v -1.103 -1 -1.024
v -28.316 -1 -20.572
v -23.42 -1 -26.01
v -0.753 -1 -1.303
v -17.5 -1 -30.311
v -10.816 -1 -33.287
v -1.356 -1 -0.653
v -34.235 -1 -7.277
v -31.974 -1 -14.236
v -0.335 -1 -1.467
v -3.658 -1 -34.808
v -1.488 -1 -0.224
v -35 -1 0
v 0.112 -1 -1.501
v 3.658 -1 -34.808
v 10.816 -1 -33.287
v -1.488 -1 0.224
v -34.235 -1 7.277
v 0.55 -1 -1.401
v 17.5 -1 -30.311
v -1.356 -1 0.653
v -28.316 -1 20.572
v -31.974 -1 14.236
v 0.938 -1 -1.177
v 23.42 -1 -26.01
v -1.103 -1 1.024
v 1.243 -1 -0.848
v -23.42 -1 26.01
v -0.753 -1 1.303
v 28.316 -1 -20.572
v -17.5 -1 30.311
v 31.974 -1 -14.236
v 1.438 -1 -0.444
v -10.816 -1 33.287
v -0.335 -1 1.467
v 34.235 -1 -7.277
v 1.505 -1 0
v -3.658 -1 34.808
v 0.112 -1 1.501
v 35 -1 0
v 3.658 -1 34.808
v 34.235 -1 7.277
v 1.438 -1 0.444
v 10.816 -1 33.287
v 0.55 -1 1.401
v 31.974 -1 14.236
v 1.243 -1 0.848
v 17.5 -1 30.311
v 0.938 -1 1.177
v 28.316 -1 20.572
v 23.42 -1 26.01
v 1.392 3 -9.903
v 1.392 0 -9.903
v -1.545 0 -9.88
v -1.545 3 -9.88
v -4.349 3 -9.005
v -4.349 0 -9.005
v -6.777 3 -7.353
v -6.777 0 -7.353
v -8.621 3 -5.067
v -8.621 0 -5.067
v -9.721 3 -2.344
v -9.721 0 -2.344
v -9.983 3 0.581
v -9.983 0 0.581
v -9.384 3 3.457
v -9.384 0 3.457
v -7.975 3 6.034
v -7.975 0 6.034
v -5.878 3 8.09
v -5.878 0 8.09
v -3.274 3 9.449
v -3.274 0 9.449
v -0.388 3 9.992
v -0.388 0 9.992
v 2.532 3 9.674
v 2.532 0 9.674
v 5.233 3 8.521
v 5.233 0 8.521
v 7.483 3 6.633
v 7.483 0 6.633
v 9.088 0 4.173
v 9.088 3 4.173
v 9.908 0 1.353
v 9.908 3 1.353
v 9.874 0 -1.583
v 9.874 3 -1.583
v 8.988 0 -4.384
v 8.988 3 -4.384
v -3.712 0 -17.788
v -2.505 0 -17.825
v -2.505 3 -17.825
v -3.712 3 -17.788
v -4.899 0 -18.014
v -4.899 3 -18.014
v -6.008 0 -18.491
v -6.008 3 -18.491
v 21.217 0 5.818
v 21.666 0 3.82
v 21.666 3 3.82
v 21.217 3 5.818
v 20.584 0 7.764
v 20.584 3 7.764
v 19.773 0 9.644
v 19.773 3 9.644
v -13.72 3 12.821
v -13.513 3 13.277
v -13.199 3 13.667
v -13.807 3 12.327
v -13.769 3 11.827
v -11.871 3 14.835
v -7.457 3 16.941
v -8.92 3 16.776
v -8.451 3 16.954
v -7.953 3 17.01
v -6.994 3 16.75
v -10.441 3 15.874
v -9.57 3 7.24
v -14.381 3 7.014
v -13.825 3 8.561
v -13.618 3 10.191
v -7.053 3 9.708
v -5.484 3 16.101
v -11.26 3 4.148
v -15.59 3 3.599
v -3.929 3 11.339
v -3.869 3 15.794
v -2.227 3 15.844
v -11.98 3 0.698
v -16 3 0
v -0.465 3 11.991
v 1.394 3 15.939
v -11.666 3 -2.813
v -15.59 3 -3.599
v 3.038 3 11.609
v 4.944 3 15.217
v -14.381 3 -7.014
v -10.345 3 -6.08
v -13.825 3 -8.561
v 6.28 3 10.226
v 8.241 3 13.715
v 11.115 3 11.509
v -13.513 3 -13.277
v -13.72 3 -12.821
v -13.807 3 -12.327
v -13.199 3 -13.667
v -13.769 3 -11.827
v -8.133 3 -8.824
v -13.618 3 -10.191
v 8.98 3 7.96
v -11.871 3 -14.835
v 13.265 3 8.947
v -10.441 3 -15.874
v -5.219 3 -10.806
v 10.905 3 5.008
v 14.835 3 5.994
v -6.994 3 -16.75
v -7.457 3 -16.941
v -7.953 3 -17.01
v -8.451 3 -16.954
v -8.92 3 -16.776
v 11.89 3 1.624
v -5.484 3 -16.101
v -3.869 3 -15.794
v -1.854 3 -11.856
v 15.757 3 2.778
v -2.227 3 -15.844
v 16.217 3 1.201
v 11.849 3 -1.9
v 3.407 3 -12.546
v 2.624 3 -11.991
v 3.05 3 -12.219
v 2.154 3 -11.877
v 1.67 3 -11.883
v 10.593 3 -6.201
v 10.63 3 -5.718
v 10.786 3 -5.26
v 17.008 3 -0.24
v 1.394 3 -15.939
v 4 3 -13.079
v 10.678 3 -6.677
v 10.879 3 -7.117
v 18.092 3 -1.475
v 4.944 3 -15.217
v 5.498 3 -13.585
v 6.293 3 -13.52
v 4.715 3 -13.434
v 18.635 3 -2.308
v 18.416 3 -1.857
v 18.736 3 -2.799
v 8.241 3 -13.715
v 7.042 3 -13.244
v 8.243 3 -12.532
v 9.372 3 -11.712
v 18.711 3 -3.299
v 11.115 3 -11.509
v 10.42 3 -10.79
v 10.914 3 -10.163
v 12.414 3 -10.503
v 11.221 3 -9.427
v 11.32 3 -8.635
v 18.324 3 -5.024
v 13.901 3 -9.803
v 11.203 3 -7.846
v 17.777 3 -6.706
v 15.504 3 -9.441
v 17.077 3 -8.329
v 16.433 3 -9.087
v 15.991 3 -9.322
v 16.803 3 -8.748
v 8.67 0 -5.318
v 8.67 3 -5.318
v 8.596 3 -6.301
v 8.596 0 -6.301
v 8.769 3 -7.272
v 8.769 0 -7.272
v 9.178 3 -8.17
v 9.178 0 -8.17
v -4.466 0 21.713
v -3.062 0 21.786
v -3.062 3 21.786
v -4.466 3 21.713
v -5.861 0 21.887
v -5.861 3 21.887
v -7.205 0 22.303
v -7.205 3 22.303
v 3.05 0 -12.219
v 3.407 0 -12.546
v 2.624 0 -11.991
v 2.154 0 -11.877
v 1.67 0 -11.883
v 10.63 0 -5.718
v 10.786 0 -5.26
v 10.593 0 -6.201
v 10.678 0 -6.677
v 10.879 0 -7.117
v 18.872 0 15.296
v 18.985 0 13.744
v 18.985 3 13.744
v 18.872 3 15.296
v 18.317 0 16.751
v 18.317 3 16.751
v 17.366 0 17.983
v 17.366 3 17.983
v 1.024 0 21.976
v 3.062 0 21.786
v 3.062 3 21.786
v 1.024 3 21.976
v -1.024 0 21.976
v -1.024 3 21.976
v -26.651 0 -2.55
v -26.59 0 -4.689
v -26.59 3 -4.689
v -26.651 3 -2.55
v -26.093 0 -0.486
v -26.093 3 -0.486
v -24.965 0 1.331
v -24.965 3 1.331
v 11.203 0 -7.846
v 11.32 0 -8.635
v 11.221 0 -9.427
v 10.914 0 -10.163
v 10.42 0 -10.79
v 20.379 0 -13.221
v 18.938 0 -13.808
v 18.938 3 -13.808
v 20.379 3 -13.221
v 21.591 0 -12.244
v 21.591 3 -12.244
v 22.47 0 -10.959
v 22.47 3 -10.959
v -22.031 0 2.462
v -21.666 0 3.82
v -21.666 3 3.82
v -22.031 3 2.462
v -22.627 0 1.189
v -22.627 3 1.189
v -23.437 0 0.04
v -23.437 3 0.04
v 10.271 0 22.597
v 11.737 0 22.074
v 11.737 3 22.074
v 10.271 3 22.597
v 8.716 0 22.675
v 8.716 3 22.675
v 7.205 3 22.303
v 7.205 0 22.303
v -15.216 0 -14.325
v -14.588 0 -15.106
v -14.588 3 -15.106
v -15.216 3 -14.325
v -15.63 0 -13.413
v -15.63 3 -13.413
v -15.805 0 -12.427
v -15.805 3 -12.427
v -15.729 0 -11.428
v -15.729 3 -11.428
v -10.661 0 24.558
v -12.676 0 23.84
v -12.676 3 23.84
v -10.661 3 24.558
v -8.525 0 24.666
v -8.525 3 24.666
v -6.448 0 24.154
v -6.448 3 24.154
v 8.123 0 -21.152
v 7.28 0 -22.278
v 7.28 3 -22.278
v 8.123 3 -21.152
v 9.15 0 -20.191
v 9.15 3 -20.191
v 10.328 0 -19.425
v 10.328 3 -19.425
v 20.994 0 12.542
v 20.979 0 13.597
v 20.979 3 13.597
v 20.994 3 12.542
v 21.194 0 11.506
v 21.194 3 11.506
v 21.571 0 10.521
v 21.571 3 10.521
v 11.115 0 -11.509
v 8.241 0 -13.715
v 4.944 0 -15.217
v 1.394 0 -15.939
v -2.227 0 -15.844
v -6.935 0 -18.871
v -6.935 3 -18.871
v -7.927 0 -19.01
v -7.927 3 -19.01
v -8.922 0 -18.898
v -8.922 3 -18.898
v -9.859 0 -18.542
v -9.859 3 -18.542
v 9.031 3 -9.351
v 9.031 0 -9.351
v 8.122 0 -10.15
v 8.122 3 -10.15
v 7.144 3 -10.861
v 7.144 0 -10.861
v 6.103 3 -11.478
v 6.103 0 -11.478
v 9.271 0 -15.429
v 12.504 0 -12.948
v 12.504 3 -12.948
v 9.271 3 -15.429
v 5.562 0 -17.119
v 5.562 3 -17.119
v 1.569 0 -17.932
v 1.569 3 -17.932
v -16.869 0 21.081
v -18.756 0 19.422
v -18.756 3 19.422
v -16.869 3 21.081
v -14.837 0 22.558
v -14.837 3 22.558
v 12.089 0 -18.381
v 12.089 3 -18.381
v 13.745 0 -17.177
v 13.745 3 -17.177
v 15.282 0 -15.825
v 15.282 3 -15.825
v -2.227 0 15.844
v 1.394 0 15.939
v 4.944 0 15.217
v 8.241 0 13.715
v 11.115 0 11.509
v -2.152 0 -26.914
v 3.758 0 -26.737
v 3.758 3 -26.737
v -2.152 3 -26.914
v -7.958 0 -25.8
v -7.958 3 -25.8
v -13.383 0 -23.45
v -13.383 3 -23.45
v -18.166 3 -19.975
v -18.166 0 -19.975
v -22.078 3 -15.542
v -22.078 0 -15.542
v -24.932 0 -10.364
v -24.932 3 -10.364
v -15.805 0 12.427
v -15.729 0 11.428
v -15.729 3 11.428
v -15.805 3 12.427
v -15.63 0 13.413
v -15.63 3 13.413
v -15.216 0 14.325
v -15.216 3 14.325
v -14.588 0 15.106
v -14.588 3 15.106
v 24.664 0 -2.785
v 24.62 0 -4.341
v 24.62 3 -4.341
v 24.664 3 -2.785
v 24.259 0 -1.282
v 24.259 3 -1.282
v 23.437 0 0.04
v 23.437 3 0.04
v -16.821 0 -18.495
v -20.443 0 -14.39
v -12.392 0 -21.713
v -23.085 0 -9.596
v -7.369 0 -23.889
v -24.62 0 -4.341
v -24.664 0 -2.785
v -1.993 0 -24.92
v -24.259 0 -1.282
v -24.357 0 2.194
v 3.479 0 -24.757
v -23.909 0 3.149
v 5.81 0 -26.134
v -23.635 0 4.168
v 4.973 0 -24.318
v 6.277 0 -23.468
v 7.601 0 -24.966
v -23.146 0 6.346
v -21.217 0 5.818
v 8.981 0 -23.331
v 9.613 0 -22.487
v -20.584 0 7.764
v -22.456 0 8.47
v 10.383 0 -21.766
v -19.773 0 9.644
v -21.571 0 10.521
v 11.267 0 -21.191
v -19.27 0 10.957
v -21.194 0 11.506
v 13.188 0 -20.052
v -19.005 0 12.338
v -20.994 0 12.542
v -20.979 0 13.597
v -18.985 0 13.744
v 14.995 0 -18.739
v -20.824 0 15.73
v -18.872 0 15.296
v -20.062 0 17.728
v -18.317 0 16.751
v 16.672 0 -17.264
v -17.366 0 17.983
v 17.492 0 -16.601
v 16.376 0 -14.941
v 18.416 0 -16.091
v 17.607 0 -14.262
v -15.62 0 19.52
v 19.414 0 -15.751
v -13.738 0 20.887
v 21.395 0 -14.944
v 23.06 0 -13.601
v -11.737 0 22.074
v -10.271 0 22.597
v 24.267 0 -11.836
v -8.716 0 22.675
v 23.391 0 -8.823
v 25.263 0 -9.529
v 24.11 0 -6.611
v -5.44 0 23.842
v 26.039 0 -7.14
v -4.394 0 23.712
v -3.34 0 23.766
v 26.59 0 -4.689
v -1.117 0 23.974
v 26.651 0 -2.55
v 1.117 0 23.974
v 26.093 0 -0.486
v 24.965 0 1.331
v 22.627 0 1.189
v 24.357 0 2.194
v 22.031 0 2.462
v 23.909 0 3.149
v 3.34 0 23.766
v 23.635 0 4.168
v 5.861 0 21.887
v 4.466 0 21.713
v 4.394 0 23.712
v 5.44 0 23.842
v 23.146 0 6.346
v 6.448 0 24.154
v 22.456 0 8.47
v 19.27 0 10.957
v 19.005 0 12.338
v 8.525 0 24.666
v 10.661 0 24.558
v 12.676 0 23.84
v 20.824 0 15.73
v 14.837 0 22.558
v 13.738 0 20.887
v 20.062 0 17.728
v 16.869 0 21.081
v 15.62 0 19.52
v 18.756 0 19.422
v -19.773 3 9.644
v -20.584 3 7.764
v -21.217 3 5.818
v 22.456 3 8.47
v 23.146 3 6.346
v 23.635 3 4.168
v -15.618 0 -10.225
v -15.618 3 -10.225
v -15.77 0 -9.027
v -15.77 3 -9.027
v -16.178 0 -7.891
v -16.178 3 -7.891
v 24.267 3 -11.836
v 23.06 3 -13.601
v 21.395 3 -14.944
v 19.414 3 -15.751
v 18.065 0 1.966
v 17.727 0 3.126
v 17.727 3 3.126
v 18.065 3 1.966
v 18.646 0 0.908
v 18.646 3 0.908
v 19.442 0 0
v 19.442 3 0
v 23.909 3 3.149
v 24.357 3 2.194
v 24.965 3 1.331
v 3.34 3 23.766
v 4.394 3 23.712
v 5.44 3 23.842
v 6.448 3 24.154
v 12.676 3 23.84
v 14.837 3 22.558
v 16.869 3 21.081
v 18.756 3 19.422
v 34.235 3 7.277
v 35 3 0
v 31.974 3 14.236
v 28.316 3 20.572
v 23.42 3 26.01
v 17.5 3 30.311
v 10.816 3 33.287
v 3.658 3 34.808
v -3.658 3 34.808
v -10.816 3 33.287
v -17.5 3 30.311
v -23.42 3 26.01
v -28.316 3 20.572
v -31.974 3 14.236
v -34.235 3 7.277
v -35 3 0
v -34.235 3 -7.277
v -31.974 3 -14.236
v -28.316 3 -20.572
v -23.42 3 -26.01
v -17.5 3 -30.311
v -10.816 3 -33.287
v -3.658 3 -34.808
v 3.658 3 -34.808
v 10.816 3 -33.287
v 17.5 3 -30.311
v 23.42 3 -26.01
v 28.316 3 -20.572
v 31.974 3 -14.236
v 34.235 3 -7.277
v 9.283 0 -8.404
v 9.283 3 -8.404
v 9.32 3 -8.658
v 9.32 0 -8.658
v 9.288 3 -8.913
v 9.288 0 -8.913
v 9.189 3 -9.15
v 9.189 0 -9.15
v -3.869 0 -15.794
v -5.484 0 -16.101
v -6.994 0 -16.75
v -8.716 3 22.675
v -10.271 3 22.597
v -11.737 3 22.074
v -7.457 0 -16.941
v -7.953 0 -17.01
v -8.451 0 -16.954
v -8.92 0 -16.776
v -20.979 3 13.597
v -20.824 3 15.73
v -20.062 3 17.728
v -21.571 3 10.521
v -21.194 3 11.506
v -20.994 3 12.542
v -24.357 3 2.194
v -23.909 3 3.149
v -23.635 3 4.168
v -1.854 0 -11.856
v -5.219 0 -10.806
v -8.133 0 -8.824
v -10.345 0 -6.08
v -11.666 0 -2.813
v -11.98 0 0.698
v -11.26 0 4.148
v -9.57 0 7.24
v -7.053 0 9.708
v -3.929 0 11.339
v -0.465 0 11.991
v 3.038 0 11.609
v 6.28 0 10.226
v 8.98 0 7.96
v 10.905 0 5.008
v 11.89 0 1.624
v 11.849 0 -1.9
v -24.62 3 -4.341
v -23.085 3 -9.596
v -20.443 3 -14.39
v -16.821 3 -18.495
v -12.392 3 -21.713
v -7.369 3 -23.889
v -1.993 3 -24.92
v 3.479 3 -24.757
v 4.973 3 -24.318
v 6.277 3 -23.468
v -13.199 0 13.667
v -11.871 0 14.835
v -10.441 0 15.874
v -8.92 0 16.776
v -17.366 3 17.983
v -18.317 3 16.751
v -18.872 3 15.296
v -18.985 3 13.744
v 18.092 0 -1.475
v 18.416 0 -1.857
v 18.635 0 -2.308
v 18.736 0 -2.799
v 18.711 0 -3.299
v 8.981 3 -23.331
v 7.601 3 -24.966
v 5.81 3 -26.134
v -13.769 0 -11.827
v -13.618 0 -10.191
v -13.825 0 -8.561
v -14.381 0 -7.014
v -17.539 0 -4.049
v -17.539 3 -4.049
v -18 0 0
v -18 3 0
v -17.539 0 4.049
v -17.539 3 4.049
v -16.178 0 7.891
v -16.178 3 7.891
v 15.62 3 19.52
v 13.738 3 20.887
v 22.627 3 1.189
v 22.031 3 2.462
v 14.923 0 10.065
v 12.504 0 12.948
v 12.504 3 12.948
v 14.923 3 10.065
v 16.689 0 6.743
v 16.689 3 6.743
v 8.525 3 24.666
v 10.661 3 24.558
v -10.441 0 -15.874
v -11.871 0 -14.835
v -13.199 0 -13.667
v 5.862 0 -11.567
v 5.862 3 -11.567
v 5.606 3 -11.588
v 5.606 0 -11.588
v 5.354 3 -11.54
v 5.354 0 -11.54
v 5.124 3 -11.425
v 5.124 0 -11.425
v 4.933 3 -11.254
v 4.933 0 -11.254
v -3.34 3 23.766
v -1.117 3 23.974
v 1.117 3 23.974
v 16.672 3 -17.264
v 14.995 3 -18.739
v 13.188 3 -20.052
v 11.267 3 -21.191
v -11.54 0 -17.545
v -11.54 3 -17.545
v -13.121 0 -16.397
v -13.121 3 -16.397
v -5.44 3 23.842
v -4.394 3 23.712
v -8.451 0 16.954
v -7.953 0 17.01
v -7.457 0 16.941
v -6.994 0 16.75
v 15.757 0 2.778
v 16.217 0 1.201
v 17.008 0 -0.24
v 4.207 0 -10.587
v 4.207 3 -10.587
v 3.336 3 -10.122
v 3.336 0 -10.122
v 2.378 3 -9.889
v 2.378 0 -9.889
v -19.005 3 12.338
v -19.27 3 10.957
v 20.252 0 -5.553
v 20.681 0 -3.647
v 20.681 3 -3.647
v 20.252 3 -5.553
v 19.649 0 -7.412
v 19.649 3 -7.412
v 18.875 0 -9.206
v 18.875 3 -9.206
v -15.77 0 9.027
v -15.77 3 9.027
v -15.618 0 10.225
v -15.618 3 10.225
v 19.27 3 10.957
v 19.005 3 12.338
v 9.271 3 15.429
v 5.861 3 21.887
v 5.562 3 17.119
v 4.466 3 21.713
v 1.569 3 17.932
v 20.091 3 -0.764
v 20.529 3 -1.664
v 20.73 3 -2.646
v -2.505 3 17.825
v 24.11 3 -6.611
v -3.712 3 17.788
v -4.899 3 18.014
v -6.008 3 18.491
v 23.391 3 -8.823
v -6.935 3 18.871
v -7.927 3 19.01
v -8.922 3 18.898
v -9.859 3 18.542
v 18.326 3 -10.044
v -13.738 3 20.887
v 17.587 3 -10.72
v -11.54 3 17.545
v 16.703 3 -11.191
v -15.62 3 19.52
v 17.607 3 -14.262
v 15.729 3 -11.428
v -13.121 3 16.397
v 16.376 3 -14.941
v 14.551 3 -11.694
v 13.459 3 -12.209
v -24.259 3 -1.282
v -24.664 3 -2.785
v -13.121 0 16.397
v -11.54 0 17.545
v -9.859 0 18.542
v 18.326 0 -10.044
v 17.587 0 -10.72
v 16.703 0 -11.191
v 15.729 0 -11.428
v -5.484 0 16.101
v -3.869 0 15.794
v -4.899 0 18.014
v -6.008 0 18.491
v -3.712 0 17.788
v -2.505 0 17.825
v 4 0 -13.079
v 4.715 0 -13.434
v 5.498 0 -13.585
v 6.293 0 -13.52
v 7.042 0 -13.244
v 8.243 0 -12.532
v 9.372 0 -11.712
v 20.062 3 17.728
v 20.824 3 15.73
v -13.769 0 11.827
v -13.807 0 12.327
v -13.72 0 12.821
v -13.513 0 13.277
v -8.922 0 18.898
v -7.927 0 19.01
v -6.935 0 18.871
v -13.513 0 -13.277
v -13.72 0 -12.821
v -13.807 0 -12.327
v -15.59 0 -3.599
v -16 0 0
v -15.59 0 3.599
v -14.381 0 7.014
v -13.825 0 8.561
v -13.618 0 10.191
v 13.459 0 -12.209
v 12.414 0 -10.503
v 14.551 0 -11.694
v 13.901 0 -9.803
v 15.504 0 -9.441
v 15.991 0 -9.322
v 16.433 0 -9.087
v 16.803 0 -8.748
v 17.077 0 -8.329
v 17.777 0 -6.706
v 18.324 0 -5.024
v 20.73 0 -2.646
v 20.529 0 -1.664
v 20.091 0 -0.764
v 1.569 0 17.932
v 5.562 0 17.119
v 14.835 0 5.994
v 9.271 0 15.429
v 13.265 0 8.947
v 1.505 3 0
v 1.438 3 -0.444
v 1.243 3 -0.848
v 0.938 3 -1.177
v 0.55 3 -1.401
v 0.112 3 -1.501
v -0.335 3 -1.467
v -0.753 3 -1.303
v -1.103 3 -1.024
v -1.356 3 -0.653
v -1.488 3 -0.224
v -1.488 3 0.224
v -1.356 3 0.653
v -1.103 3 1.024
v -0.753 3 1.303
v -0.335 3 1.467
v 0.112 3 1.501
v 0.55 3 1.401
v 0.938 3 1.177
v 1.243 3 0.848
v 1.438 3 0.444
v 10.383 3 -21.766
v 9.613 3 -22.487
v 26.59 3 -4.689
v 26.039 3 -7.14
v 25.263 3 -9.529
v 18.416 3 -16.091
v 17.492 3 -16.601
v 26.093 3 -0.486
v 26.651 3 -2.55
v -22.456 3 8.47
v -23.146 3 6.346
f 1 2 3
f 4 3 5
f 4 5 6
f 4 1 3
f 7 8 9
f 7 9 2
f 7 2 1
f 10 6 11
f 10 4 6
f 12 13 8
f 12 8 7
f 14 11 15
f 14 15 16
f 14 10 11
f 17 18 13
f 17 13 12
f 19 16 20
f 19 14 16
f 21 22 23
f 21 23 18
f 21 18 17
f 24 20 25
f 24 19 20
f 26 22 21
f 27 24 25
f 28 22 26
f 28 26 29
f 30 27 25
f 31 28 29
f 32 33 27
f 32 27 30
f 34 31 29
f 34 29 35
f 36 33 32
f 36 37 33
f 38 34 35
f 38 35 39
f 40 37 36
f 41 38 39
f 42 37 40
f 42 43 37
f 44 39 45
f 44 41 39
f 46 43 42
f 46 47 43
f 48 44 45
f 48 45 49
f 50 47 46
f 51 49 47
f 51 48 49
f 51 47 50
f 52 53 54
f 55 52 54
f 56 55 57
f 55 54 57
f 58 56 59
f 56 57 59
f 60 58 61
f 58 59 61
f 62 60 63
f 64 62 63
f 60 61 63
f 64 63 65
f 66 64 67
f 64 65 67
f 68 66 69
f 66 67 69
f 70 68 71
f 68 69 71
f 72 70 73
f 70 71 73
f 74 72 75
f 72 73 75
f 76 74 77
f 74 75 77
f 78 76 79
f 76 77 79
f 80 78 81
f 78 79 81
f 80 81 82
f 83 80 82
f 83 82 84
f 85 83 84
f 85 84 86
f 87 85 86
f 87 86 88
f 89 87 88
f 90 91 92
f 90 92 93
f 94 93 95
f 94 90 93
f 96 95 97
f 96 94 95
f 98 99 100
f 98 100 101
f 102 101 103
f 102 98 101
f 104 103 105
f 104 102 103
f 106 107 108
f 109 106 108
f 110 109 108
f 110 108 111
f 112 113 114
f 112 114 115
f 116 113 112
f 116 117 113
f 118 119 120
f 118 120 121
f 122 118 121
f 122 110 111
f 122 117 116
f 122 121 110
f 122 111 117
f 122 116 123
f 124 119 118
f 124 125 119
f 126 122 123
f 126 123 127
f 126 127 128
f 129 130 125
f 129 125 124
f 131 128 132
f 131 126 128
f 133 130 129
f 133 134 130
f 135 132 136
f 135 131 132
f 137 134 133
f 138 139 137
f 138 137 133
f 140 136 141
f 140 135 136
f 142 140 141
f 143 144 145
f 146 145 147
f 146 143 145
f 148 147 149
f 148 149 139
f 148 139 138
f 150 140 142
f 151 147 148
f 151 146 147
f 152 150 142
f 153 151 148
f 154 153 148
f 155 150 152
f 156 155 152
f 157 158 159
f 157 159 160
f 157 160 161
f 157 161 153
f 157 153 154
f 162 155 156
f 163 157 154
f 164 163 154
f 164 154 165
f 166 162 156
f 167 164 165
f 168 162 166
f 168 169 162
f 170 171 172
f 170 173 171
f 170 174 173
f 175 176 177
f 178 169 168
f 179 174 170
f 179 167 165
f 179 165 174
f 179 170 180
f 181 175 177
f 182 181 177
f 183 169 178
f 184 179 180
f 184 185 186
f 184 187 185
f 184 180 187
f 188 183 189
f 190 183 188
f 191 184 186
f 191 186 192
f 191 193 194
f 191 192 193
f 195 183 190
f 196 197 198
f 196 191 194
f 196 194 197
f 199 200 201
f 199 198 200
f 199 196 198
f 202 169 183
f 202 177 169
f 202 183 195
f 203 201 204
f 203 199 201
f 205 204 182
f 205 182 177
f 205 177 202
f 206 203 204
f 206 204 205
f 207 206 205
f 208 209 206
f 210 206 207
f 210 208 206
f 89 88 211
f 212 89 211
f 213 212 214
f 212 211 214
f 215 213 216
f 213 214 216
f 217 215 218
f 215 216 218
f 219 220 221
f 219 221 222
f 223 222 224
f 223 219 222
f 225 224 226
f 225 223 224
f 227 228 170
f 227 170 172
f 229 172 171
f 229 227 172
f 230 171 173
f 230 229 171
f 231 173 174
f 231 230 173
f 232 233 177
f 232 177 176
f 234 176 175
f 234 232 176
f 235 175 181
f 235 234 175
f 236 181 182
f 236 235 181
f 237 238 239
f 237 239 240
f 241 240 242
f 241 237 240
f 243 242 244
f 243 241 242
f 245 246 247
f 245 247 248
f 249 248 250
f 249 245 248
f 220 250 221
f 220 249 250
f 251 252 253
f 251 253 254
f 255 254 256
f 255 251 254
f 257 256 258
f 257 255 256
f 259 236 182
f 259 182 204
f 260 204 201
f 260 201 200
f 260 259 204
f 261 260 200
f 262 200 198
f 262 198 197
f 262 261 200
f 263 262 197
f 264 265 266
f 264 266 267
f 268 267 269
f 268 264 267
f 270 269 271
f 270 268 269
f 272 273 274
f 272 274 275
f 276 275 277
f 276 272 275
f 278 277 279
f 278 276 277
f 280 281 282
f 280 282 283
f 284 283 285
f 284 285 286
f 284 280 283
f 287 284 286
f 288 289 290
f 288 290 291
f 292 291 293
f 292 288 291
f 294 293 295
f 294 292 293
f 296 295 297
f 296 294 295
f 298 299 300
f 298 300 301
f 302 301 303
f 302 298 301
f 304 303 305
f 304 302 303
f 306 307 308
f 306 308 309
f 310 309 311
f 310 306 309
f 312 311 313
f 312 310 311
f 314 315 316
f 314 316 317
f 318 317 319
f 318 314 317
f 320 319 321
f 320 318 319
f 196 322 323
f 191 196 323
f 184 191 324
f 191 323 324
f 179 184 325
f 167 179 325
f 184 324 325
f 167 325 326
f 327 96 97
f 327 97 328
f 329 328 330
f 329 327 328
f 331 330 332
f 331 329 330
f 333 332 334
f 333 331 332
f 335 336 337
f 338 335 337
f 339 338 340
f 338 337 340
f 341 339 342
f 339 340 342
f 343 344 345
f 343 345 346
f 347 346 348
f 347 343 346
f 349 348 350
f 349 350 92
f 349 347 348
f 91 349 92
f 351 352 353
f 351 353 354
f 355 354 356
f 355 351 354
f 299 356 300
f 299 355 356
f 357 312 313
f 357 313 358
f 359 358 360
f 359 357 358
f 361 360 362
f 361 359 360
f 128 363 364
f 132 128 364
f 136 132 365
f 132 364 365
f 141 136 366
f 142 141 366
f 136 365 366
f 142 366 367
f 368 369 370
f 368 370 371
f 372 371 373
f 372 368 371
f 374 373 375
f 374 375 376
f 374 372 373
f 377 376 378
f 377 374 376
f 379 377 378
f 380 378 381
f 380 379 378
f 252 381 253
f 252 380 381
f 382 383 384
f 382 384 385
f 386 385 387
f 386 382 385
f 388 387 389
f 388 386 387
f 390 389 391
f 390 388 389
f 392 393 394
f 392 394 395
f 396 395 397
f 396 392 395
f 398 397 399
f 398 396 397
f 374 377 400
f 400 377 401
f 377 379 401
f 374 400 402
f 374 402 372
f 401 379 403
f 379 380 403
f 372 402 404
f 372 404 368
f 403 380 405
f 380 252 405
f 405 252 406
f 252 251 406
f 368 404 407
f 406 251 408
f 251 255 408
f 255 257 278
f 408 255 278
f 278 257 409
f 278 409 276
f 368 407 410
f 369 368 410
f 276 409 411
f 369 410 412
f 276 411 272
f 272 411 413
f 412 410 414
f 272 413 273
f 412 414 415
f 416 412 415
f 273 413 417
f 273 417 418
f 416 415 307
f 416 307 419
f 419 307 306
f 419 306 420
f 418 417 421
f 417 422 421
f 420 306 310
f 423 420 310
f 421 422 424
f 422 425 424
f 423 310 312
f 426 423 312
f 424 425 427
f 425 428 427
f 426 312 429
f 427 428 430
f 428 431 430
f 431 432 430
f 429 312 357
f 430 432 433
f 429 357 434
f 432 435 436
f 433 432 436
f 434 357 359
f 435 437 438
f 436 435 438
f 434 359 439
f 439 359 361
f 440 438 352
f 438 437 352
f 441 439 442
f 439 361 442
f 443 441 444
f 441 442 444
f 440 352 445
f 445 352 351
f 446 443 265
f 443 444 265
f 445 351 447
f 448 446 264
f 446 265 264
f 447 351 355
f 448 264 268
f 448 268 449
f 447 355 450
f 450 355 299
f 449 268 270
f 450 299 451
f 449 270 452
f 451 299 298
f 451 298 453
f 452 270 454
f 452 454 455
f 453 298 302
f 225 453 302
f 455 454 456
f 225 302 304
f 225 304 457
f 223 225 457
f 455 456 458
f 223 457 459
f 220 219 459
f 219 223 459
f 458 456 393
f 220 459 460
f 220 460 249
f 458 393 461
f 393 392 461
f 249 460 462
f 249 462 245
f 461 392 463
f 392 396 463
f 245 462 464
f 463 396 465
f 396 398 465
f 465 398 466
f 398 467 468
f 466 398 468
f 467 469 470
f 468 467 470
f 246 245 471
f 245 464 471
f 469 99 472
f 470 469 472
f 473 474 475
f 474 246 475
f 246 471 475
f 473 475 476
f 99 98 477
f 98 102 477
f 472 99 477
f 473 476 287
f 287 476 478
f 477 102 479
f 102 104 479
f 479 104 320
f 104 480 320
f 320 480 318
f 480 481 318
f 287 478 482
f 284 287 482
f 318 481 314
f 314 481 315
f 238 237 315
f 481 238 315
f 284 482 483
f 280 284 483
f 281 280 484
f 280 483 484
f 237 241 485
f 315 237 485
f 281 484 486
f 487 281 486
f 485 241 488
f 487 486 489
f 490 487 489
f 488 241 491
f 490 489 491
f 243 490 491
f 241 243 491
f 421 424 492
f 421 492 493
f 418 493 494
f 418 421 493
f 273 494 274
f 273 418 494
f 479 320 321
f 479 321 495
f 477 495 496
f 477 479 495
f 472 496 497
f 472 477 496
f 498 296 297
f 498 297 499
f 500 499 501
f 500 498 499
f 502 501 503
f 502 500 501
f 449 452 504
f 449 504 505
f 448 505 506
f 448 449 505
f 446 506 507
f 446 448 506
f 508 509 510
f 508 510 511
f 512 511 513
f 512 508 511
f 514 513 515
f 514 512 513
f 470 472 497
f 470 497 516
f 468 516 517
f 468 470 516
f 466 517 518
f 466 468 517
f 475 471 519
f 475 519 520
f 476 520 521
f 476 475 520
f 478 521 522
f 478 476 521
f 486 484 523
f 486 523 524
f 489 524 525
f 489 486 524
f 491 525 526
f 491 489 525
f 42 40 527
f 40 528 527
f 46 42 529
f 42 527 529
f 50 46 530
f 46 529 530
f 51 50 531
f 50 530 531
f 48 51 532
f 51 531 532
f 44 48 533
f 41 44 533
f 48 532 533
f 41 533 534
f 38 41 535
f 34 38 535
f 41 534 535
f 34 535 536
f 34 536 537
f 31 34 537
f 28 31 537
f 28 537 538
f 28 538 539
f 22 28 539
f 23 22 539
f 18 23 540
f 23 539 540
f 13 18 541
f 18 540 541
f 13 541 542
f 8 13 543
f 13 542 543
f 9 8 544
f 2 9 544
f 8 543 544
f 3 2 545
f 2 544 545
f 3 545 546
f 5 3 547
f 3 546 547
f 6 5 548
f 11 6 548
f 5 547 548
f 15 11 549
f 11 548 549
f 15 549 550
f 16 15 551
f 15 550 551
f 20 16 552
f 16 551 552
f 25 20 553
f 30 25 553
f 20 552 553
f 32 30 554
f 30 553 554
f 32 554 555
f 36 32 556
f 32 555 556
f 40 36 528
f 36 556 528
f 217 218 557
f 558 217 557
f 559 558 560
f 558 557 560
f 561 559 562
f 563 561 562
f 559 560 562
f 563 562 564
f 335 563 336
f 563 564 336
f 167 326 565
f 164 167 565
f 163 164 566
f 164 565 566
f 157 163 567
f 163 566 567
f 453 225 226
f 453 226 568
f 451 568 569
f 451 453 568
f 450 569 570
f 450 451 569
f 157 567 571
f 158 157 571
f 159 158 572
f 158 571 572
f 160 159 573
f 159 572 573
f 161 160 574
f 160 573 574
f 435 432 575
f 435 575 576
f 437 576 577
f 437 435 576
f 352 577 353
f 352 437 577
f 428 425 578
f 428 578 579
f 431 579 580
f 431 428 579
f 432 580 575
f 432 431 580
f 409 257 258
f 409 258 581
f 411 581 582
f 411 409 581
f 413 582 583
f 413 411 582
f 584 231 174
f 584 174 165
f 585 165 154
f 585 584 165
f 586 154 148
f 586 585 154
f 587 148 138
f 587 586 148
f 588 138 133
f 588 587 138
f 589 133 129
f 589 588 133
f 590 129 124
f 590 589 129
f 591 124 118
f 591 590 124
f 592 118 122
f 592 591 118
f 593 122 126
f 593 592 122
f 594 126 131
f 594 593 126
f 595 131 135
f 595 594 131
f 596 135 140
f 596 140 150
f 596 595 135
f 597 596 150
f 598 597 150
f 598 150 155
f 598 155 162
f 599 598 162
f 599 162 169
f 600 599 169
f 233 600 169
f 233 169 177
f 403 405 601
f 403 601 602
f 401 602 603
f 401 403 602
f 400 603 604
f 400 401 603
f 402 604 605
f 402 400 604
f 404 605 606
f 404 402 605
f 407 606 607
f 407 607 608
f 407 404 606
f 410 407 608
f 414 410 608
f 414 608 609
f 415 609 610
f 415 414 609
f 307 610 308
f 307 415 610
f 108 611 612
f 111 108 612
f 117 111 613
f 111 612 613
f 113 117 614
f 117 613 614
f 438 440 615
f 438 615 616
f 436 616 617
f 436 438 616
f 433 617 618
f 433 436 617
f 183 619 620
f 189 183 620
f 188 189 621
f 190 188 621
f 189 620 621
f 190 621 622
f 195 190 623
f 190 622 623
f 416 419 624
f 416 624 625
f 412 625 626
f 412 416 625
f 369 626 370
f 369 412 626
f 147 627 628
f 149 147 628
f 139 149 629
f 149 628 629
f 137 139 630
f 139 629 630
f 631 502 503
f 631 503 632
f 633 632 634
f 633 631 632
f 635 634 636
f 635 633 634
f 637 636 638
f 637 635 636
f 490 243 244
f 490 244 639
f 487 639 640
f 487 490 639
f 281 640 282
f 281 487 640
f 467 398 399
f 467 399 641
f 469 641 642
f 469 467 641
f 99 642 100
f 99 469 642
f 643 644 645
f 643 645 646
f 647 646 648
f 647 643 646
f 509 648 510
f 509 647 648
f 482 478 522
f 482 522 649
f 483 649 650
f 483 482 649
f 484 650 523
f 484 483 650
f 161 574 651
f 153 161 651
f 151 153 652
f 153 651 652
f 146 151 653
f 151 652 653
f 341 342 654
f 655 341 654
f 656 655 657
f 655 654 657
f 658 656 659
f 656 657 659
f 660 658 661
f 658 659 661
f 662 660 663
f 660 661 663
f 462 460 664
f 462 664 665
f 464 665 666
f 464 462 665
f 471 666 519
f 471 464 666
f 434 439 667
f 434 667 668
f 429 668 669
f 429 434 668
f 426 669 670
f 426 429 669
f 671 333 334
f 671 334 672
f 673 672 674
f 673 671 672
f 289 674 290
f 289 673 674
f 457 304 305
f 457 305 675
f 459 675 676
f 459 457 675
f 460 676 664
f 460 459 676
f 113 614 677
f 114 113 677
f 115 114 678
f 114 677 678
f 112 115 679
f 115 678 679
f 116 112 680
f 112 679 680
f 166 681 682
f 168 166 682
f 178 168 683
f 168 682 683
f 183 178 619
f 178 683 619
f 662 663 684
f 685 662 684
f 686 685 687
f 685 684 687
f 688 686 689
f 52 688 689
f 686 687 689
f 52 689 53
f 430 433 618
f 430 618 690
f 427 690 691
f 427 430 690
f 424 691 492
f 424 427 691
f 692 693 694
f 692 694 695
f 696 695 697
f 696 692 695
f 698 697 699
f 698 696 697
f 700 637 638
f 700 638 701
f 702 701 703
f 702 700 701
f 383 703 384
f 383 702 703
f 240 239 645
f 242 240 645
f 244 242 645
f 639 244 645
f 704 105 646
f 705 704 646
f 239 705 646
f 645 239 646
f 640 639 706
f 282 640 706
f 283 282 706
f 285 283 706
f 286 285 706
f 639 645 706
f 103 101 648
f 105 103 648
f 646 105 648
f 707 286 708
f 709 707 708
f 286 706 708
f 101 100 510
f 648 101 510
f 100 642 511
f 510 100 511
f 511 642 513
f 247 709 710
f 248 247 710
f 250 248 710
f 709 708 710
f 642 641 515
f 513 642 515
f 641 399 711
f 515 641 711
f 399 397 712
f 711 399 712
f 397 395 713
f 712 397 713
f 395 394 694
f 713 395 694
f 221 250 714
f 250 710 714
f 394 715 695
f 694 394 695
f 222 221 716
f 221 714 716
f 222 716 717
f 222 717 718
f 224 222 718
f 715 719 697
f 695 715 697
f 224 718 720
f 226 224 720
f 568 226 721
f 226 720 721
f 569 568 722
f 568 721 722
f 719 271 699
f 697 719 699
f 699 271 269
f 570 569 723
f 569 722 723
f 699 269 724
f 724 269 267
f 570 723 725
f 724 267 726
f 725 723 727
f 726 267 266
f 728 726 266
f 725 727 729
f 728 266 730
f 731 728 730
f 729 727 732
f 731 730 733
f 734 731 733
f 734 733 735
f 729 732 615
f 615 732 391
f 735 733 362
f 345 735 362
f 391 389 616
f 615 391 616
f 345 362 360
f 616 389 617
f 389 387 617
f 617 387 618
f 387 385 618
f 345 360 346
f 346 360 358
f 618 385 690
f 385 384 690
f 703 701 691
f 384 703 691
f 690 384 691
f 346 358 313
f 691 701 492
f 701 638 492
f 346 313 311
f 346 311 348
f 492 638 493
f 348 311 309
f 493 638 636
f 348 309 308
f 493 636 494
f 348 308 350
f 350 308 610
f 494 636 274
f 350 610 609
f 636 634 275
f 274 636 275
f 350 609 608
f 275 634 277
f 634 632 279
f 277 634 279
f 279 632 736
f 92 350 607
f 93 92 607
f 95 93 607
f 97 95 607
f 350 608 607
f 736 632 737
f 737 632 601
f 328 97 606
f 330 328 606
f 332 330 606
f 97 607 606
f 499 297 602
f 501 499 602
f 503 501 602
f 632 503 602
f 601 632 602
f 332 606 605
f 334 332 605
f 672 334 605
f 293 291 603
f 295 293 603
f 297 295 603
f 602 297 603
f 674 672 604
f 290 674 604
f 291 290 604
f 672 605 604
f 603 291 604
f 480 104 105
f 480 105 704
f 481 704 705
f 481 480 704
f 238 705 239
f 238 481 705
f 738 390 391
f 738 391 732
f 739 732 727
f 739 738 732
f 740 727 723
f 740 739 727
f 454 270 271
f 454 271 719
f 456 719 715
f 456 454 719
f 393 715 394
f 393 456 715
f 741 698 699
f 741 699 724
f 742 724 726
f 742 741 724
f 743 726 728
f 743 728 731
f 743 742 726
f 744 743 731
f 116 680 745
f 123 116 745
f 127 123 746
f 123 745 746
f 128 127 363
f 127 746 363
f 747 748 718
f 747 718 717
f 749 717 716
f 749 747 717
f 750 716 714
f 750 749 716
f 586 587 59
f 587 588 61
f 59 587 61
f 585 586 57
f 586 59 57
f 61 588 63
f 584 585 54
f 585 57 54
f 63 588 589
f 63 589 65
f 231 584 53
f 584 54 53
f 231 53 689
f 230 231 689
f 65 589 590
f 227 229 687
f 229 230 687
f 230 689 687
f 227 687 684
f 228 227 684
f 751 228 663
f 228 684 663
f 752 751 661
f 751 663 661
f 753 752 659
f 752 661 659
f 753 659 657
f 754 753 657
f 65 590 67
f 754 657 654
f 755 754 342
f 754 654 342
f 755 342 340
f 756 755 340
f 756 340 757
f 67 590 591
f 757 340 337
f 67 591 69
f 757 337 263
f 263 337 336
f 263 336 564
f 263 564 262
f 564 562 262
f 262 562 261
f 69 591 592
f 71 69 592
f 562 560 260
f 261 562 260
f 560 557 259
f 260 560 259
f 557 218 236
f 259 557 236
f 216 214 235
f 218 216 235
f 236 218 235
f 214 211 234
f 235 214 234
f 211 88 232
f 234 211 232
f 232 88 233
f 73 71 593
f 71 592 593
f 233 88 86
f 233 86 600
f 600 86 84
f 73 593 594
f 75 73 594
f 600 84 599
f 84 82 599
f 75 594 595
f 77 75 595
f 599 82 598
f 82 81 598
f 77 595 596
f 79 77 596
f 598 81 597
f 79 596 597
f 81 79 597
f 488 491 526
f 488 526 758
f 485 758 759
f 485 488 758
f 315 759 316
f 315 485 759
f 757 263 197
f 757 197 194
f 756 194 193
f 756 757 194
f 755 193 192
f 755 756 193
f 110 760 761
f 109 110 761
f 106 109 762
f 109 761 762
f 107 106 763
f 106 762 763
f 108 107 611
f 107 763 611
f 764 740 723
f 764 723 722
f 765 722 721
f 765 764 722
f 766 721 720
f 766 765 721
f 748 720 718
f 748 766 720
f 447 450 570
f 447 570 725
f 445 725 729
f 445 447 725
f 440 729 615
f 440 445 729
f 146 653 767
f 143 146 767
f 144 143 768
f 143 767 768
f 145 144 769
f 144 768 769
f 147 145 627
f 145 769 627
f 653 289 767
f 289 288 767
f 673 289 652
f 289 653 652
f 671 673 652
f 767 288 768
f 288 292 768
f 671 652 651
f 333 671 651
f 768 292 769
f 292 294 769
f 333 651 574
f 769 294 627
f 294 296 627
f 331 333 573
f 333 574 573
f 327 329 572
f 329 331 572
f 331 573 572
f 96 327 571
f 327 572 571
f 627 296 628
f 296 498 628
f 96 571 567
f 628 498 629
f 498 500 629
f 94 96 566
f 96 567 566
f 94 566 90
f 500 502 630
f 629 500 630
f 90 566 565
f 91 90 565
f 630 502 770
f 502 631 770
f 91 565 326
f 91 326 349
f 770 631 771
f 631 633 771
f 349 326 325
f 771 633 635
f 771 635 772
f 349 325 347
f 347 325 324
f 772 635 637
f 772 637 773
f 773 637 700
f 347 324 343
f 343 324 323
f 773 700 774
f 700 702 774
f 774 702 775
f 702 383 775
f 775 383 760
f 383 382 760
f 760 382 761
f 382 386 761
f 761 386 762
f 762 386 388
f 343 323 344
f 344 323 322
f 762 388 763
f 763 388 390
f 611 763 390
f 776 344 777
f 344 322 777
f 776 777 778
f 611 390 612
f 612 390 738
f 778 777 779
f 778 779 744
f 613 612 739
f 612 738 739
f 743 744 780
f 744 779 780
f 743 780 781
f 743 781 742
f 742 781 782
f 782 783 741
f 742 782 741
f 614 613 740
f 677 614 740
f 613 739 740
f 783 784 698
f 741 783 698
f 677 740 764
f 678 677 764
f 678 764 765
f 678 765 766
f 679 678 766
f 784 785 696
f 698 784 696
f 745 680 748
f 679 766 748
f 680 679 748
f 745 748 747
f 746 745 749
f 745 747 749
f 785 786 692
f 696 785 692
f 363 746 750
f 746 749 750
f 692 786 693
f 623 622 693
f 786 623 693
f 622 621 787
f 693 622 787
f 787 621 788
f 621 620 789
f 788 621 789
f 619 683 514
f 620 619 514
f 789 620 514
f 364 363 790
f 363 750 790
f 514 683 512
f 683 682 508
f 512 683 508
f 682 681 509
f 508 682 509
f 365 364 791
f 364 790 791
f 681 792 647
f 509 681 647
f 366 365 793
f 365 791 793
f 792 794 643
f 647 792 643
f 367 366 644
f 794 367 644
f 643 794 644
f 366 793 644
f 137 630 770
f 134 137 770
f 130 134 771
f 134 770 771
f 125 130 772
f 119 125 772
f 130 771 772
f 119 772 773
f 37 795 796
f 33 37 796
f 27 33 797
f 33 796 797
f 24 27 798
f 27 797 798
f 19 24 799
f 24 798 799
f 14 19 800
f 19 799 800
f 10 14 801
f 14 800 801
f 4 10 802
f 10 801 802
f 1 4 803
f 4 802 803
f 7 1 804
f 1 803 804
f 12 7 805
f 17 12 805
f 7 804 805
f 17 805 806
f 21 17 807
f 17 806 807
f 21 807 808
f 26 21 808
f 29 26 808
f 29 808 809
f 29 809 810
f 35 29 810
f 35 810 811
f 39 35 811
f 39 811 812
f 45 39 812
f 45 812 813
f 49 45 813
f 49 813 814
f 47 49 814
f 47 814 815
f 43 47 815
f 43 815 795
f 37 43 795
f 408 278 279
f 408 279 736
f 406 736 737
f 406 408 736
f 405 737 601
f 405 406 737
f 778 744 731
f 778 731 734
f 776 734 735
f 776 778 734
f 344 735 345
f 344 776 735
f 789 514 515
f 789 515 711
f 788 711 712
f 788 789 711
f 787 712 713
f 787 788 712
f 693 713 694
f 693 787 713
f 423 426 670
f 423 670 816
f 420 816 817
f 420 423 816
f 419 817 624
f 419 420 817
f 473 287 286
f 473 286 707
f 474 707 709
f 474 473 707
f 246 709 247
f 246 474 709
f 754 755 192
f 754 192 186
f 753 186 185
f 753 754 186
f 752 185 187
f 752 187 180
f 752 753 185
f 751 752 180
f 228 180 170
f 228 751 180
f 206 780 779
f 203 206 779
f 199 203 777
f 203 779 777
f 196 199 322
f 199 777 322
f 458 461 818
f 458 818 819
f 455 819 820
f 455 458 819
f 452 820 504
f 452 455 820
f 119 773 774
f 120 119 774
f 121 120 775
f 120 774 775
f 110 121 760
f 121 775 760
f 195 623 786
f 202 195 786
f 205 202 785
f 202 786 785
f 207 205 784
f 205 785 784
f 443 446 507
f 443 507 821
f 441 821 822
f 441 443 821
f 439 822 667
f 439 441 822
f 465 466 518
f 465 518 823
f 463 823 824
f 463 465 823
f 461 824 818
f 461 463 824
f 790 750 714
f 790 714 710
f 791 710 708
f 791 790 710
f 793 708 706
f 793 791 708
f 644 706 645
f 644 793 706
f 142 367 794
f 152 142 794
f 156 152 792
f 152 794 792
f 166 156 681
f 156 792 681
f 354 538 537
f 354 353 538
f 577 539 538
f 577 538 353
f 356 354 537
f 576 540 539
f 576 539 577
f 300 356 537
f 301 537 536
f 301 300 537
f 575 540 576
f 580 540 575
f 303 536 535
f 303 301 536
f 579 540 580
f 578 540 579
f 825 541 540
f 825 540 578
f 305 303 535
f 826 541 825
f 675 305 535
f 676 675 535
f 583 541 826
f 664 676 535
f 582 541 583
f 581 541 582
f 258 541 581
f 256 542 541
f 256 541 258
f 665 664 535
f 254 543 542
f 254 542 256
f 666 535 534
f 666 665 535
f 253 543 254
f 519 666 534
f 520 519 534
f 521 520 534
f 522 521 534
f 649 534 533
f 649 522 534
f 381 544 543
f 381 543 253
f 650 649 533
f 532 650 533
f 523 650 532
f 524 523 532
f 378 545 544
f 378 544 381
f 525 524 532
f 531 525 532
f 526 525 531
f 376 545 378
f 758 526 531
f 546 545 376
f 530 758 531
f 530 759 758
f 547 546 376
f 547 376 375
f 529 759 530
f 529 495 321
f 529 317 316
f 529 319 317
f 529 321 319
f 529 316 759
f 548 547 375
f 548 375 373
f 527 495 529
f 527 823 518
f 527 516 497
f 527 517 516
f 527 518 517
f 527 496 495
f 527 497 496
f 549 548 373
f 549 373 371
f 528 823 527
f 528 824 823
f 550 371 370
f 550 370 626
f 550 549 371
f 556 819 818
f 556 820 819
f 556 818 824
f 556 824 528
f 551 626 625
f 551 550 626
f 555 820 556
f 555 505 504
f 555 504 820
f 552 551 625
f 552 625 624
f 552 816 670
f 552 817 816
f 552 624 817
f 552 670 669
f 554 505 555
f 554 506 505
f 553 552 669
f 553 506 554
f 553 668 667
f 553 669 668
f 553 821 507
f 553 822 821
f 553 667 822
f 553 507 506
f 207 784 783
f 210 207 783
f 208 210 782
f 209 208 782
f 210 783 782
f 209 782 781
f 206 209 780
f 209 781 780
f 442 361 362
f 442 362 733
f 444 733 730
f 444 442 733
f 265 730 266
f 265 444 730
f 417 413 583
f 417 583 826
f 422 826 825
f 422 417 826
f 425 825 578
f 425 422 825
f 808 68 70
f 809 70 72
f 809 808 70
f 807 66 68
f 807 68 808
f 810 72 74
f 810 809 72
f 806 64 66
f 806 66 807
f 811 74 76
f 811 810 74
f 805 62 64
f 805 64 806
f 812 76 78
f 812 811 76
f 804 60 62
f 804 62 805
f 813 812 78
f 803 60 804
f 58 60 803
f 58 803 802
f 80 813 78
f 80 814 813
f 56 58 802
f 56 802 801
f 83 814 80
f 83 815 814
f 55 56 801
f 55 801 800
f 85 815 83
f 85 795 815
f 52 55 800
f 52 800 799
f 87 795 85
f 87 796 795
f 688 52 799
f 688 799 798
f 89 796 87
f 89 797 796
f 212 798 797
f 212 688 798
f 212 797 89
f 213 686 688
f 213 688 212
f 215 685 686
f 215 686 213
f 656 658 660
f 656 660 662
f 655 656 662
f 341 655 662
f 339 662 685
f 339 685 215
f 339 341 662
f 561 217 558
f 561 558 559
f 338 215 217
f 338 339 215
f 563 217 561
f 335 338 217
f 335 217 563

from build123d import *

# Parameters (mm, degrees)
EXTRUDE_1_DEPTH     = 3
EXTRUDE_1_2_DEPTH   = 3
EXTRUDE_1_3_DEPTH   = 3
SKETCH_2_R          = 35
EXTRUDE_1_4_DEPTH   = 3
SKETCH_3_R          = 35
EXTRUDE_2_DEPTH     = 1
SKETCH_4_R          = 1.505
CUT_EXTRUDE_1_DEPTH = 5


with BuildPart() as part:
    # 草图2 → 凸台-拉伸1 (new body)
    with BuildSketch(Plane(origin=(0, 0, 0), x_dir=(1, 0, 0), z_dir=(0, 1, 0))):
        with BuildLine():
            ThreePointArc((4.933437269, 11.253544382), (3.336493541, 10.122155344), (1.39173101, 9.902680687))
            ThreePointArc((1.39173101, 9.902680687), (-5.877852523, -8.090169944), (8.987940463, 4.383711468))
            ThreePointArc((8.987940463, 4.383711468), (8.595708593, 6.301111944), (9.178240759, 8.169514123))
            ThreePointArc((9.178240759, 8.169514123), (9.312956952, 8.786525533), (9.030558816, 9.351417404))
            ThreePointArc((9.030558816, 9.351417404), (7.64120828, 10.517220927), (6.103130316, 11.478318707))
            ThreePointArc((6.103130316, 11.478318707), (5.478620398, 11.572334106), (4.933437269, 11.253544382))
        make_face()
    extrude(amount=EXTRUDE_1_DEPTH)



with BuildPart() as body_2:
    # 草图2 → Extrude 1 2 (new body)
    with BuildSketch(Plane(origin=(0, 0, 0), x_dir=(1, 0, 0), z_dir=(0, 1, 0))):
        with BuildLine():
            ThreePointArc((-2.226769615, -15.8442891), (4.94427191, -15.216904261), (11.114533927, -11.509436805))
            ThreePointArc((11.114533927, -11.509436805), (14.127161486, -7.511545005), (15.756924048, -2.778370843))
            ThreePointArc((15.756924048, -2.778370843), (16.57293705, -0.458749656), (18.091681962, 1.475141128))
            ThreePointArc((18.091681962, 1.475141128), (18.635380141, 2.307784992), (18.711347307, 3.299315376))
            ThreePointArc((18.711347307, 3.299315376), (18.07007381, 5.871322893), (17.07708688, 8.329051789))
            ThreePointArc((17.07708688, 8.329051789), (16.432821214, 9.08656434), (15.503544365, 9.440609604))
            ThreePointArc((15.503544365, 9.440609604), (13.138141438, 10.112464253), (11.114533927, 11.509436805))
            ThreePointArc((11.114533927, 11.509436805), (4.94427191, 15.216904261), (-2.226769615, 15.8442891))
            ThreePointArc((-2.226769615, 15.8442891), (-4.685022346, 15.903561216), (-6.993579766, 16.750368343))
            ThreePointArc((-6.993579766, 16.750368343), (-7.953483115, 17.010154935), (-8.919959693, 16.776004264))
            ThreePointArc((-8.919959693, 16.776004264), (-11.167919794, 15.371322893), (-13.198509039, 13.667456206))
            ThreePointArc((-13.198509039, 13.667456206), (-13.719857247, 12.820638895), (-13.769411964, 11.827438089))
            ThreePointArc((-13.769411964, 11.827438089), (-13.677434002, 9.370191718), (-14.380704741, 7.013938349))
            ThreePointArc((-14.380704741, 7.013938349), (-16, 0), (-14.380704741, -7.013938349))
            ThreePointArc((-14.380704741, -7.013938349), (-13.677434002, -9.370191718), (-13.769411964, -11.827438089))
            ThreePointArc((-13.769411964, -11.827438089), (-13.719857247, -12.820638895), (-13.198509039, -13.667456206))
            ThreePointArc((-13.198509039, -13.667456206), (-11.167919794, -15.371322893), (-8.919959693, -16.776004264))
            ThreePointArc((-8.919959693, -16.776004264), (-7.953483115, -17.010154935), (-6.993579766, -16.750368343))
            ThreePointArc((-6.993579766, -16.750368343), (-4.685022346, -15.903561216), (-2.226769615, -15.8442891))
        make_face()
        with BuildLine():
            ThreePointArc((10.785528556, 5.260453761), (10.593186617, 6.200705058), (10.878847662, 7.116928659))
            ThreePointArc((10.878847662, 7.116928659), (11.297524269, 9.034502472), (10.419875557, 10.790097005))
            ThreePointArc((10.419875557, 10.790097005), (8.816778784, 12.135254916), (7.042073442, 13.244213893))
            ThreePointArc((7.042073442, 13.244213893), (5.101195454, 13.536398874), (3.40685257, 12.545650862))
            ThreePointArc((3.40685257, 12.545650862), (2.623746261, 11.990842401), (1.670077212, 11.883216825))
            ThreePointArc((1.670077212, 11.883216825), (-7.053423028, -9.708203932), (10.785528556, 5.260453761))
        make_face(mode=Mode.SUBTRACT)
    extrude(amount=EXTRUDE_1_2_DEPTH)


with BuildPart() as body_3:
    # 草图2 → Extrude 1 3 (new body)
    with BuildSketch(Plane(origin=(0, 0, 0), x_dir=(1, 0, 0), z_dir=(0, 1, 0))):
        with BuildLine():
            ThreePointArc((22.469851157, 10.95927867), (23.776412907, 7.725424859), (24.620193825, 4.341204442))
            ThreePointArc((24.620193825, 4.341204442), (24.516588458, 2.018942005), (23.437340957, -0.039907608))
            ThreePointArc((23.437340957, -0.039907608), (22.300880056, -1.81261067), (21.665770566, -3.820259909))
            ThreePointArc((21.665770566, -3.820259909), (20.923243358, -6.798373876), (19.773469019, -9.644165229))
            ThreePointArc((19.773469019, -9.644165229), (19.107216775, -11.641695573), (18.98466424, -13.743837434))
            ThreePointArc((18.98466424, -13.743837434), (18.647632371, -16.043847525), (17.366459261, -17.983495008))
            ThreePointArc((17.366459261, -17.983495008), (14.694631307, -20.225424859), (11.73678907, -22.073689821))
            ThreePointArc((11.73678907, -22.073689821), (9.496170427, -22.69277382), (7.204582268, -22.302567971))
            ThreePointArc((7.204582268, -22.302567971), (5.167455737, -21.769524797), (3.061808221, -21.785897512))
            ThreePointArc((3.061808221, -21.785897512), (0, -22), (-3.061808221, -21.785897512))
            ThreePointArc((-3.061808221, -21.785897512), (-5.167455737, -21.769524797), (-7.204582268, -22.302567971))
            ThreePointArc((-7.204582268, -22.302567971), (-9.496170427, -22.69277382), (-11.73678907, -22.073689821))
            ThreePointArc((-11.73678907, -22.073689821), (-14.694631307, -20.225424859), (-17.366459261, -17.983495008))
            ThreePointArc((-17.366459261, -17.983495008), (-18.647632371, -16.043847525), (-18.98466424, -13.743837434))
            ThreePointArc((-18.98466424, -13.743837434), (-19.107216775, -11.641695573), (-19.773469019, -9.644165229))
            ThreePointArc((-19.773469019, -9.644165229), (-20.923243358, -6.798373876), (-21.665770566, -3.820259909))
            ThreePointArc((-21.665770566, -3.820259909), (-22.300880056, -1.81261067), (-23.437340957, -0.039907608))
            ThreePointArc((-23.437340957, -0.039907608), (-24.516588458, 2.018942005), (-24.620193825, 4.341204442))
            ThreePointArc((-24.620193825, 4.341204442), (-14.694631307, 20.225424859), (3.479327524, 24.756701719))
            ThreePointArc((3.479327524, 24.756701719), (5.655914528, 23.9405486), (7.280491049, 22.277903712))
            ThreePointArc((7.280491049, 22.277903712), (8.615246116, 20.649269795), (10.328374381, 19.424847043))
            ThreePointArc((10.328374381, 19.424847043), (12.93127555, 17.798373876), (15.28248415, 15.825475607))
            ThreePointArc((15.28248415, 15.825475607), (16.976365134, 14.574561246), (18.937750033, 13.8084093))
            ThreePointArc((18.937750033, 13.8084093), (21.021041042, 12.777130739), (22.469851157, 10.95927867))
        make_face()
        with BuildLine():
            ThreePointArc((12.503850668, -12.948116406), (15.893056671, -8.45048813), (17.726539554, -3.125667198))
            ThreePointArc((17.726539554, -3.125667198), (18.326181707, -1.421107788), (19.442222095, 0))
            ThreePointArc((19.442222095, 0), (20.529100807, 1.664494981), (20.680962813, 3.646611731))
            ThreePointArc((20.680962813, 3.646611731), (19.972186842, 6.489356882), (18.874674972, 9.205794083))
            ThreePointArc((18.874674972, 9.205794083), (17.586757035, 10.72009797), (15.729088083, 11.427851419))
            ThreePointArc((15.729088083, 11.427851419), (13.990886243, 11.921559689), (12.503850668, 12.948116406))
            ThreePointArc((12.503850668, 12.948116406), (5.562305899, 17.119017293), (-2.505115817, 17.824825237))
            ThreePointArc((-2.505115817, 17.824825237), (-4.311547767, 17.868380988), (-6.007977036, 18.490652015))
            ThreePointArc((-6.007977036, 18.490652015), (-7.926869827, 19.00997786), (-9.858902819, 18.54189945))
            ThreePointArc((-9.858902819, 18.54189945), (-12.343490298, 16.989356882), (-14.58782578, 15.106135807))
            ThreePointArc((-14.58782578, 15.106135807), (-15.63002583, 13.413307424), (-15.729088083, 11.427851419))
            ThreePointArc((-15.729088083, 11.427851419), (-15.661498642, 9.622158987), (-16.178292833, 7.890680642))
            ThreePointArc((-16.178292833, 7.890680642), (-18, 0), (-16.178292833, -7.890680642))
            ThreePointArc((-16.178292833, -7.890680642), (-15.661498642, -9.622158987), (-15.729088083, -11.427851419))
            ThreePointArc((-15.729088083, -11.427851419), (-15.63002583, -13.413307424), (-14.58782578, -15.106135807))
            ThreePointArc((-14.58782578, -15.106135807), (-12.343490298, -16.989356882), (-9.858902819, -18.54189945))
            ThreePointArc((-9.858902819, -18.54189945), (-7.926869827, -19.00997786), (-6.007977036, -18.490652015))
            ThreePointArc((-6.007977036, -18.490652015), (-4.311547767, -17.868380988), (-2.505115817, -17.824825237))
            ThreePointArc((-2.505115817, -17.824825237), (5.562305899, -17.119017293), (12.503850668, -12.948116406))
        make_face(mode=Mode.SUBTRACT)
    extrude(amount=EXTRUDE_1_3_DEPTH)


with BuildPart() as body_4:
    # 草图2 → Extrude 1 4 (new body)
    with BuildSketch(Plane(origin=(0, 0, 0), x_dir=(1, 0, 0), z_dir=(0, 1, 0))):
        Circle(SKETCH_2_R)
        with BuildLine():
            ThreePointArc((-21.571057111, -10.520907523), (-21.071193566, -12.019578048), (-20.979247092, -13.596734588))
            ThreePointArc((-20.979247092, -13.596734588), (-20.516153338, -16.757030106), (-18.755776002, -19.422174609))
            ThreePointArc((-18.755776002, -19.422174609), (-15.870201812, -21.843458848), (-12.675732195, -23.839585007))
            ThreePointArc((-12.675732195, -23.839585007), (-9.597042635, -24.6902284), (-6.448319149, -24.15407171))
            ThreePointArc((-6.448319149, -24.15407171), (-4.919941122, -23.754149829), (-3.340154423, -23.76643365))
            ThreePointArc((-3.340154423, -23.76643365), (0, -24), (3.340154423, -23.76643365))
            ThreePointArc((3.340154423, -23.76643365), (4.919941122, -23.754149829), (6.448319149, -24.15407171))
            ThreePointArc((6.448319149, -24.15407171), (9.597042635, -24.6902284), (12.675732195, -23.839585007))
            ThreePointArc((12.675732195, -23.839585007), (15.870201812, -21.843458848), (18.755776002, -19.422174609))
            ThreePointArc((18.755776002, -19.422174609), (20.516153338, -16.757030106), (20.979247092, -13.596734588))
            ThreePointArc((20.979247092, -13.596734588), (21.071193566, -12.019578048), (21.571057111, -10.520907523))
            ThreePointArc((21.571057111, -10.520907523), (22.825356391, -7.416407865), (23.635386072, -4.167556264))
            ThreePointArc((23.635386072, -4.167556264), (24.111884402, -2.66129392), (24.964527497, -1.331302695))
            ThreePointArc((24.964527497, -1.331302695), (26.447451878, 1.497629765), (26.589809331, 4.688500797))
            ThreePointArc((26.589809331, 4.688500797), (25.67852594, 8.343458848), (24.26743925, 11.836020963))
            ThreePointArc((24.26743925, 11.836020963), (22.276722717, 14.333814244), (19.414206911, 15.750827598))
            ThreePointArc((19.414206911, 15.750827598), (17.942654929, 16.325642065), (16.671800891, 17.264155208))
            ThreePointArc((16.671800891, 17.264155208), (14.106846055, 19.416407865), (11.267317507, 21.190742229))
            ThreePointArc((11.267317507, 21.190742229), (9.982022971, 22.109379732), (8.980607357, 23.331281394))
            ThreePointArc((8.980607357, 23.331281394), (6.748381541, 25.615814497), (3.757673726, 26.737237856))
            ThreePointArc((3.757673726, 26.737237856), (-15.870201812, 21.843458848), (-26.589809331, 4.688500797))
            ThreePointArc((-26.589809331, 4.688500797), (-26.447451878, 1.497629765), (-24.964527497, -1.331302695))
            ThreePointArc((-24.964527497, -1.331302695), (-24.111884402, -2.66129392), (-23.635386072, -4.167556264))
            ThreePointArc((-23.635386072, -4.167556264), (-22.825356391, -7.416407865), (-21.571057111, -10.520907523))
        make_face(mode=Mode.SUBTRACT)
    extrude(amount=EXTRUDE_1_4_DEPTH)


with BuildPart() as part_1:
    add(part.part)

    add(body_2.part)  # 凸台-拉伸2 merges body 2

    add(body_3.part)  # 凸台-拉伸2 merges body 3

    add(body_4.part)  # 凸台-拉伸2 merges body 4
    # 草图3 → 凸台-拉伸2 (add)
    with BuildSketch(Plane.XZ):
        Circle(SKETCH_3_R)
    extrude(amount=EXTRUDE_2_DEPTH)

    # 草图4 → 切除-拉伸1 (cut, through all)
    with BuildSketch(Plane(origin=(0, 3, 0), x_dir=(1, 0, 0), z_dir=(0, 1, 0))):
        Circle(SKETCH_4_R)
    extrude(amount=-CUT_EXTRUDE_1_DEPTH, mode=Mode.SUBTRACT)


solid = part_1.part
